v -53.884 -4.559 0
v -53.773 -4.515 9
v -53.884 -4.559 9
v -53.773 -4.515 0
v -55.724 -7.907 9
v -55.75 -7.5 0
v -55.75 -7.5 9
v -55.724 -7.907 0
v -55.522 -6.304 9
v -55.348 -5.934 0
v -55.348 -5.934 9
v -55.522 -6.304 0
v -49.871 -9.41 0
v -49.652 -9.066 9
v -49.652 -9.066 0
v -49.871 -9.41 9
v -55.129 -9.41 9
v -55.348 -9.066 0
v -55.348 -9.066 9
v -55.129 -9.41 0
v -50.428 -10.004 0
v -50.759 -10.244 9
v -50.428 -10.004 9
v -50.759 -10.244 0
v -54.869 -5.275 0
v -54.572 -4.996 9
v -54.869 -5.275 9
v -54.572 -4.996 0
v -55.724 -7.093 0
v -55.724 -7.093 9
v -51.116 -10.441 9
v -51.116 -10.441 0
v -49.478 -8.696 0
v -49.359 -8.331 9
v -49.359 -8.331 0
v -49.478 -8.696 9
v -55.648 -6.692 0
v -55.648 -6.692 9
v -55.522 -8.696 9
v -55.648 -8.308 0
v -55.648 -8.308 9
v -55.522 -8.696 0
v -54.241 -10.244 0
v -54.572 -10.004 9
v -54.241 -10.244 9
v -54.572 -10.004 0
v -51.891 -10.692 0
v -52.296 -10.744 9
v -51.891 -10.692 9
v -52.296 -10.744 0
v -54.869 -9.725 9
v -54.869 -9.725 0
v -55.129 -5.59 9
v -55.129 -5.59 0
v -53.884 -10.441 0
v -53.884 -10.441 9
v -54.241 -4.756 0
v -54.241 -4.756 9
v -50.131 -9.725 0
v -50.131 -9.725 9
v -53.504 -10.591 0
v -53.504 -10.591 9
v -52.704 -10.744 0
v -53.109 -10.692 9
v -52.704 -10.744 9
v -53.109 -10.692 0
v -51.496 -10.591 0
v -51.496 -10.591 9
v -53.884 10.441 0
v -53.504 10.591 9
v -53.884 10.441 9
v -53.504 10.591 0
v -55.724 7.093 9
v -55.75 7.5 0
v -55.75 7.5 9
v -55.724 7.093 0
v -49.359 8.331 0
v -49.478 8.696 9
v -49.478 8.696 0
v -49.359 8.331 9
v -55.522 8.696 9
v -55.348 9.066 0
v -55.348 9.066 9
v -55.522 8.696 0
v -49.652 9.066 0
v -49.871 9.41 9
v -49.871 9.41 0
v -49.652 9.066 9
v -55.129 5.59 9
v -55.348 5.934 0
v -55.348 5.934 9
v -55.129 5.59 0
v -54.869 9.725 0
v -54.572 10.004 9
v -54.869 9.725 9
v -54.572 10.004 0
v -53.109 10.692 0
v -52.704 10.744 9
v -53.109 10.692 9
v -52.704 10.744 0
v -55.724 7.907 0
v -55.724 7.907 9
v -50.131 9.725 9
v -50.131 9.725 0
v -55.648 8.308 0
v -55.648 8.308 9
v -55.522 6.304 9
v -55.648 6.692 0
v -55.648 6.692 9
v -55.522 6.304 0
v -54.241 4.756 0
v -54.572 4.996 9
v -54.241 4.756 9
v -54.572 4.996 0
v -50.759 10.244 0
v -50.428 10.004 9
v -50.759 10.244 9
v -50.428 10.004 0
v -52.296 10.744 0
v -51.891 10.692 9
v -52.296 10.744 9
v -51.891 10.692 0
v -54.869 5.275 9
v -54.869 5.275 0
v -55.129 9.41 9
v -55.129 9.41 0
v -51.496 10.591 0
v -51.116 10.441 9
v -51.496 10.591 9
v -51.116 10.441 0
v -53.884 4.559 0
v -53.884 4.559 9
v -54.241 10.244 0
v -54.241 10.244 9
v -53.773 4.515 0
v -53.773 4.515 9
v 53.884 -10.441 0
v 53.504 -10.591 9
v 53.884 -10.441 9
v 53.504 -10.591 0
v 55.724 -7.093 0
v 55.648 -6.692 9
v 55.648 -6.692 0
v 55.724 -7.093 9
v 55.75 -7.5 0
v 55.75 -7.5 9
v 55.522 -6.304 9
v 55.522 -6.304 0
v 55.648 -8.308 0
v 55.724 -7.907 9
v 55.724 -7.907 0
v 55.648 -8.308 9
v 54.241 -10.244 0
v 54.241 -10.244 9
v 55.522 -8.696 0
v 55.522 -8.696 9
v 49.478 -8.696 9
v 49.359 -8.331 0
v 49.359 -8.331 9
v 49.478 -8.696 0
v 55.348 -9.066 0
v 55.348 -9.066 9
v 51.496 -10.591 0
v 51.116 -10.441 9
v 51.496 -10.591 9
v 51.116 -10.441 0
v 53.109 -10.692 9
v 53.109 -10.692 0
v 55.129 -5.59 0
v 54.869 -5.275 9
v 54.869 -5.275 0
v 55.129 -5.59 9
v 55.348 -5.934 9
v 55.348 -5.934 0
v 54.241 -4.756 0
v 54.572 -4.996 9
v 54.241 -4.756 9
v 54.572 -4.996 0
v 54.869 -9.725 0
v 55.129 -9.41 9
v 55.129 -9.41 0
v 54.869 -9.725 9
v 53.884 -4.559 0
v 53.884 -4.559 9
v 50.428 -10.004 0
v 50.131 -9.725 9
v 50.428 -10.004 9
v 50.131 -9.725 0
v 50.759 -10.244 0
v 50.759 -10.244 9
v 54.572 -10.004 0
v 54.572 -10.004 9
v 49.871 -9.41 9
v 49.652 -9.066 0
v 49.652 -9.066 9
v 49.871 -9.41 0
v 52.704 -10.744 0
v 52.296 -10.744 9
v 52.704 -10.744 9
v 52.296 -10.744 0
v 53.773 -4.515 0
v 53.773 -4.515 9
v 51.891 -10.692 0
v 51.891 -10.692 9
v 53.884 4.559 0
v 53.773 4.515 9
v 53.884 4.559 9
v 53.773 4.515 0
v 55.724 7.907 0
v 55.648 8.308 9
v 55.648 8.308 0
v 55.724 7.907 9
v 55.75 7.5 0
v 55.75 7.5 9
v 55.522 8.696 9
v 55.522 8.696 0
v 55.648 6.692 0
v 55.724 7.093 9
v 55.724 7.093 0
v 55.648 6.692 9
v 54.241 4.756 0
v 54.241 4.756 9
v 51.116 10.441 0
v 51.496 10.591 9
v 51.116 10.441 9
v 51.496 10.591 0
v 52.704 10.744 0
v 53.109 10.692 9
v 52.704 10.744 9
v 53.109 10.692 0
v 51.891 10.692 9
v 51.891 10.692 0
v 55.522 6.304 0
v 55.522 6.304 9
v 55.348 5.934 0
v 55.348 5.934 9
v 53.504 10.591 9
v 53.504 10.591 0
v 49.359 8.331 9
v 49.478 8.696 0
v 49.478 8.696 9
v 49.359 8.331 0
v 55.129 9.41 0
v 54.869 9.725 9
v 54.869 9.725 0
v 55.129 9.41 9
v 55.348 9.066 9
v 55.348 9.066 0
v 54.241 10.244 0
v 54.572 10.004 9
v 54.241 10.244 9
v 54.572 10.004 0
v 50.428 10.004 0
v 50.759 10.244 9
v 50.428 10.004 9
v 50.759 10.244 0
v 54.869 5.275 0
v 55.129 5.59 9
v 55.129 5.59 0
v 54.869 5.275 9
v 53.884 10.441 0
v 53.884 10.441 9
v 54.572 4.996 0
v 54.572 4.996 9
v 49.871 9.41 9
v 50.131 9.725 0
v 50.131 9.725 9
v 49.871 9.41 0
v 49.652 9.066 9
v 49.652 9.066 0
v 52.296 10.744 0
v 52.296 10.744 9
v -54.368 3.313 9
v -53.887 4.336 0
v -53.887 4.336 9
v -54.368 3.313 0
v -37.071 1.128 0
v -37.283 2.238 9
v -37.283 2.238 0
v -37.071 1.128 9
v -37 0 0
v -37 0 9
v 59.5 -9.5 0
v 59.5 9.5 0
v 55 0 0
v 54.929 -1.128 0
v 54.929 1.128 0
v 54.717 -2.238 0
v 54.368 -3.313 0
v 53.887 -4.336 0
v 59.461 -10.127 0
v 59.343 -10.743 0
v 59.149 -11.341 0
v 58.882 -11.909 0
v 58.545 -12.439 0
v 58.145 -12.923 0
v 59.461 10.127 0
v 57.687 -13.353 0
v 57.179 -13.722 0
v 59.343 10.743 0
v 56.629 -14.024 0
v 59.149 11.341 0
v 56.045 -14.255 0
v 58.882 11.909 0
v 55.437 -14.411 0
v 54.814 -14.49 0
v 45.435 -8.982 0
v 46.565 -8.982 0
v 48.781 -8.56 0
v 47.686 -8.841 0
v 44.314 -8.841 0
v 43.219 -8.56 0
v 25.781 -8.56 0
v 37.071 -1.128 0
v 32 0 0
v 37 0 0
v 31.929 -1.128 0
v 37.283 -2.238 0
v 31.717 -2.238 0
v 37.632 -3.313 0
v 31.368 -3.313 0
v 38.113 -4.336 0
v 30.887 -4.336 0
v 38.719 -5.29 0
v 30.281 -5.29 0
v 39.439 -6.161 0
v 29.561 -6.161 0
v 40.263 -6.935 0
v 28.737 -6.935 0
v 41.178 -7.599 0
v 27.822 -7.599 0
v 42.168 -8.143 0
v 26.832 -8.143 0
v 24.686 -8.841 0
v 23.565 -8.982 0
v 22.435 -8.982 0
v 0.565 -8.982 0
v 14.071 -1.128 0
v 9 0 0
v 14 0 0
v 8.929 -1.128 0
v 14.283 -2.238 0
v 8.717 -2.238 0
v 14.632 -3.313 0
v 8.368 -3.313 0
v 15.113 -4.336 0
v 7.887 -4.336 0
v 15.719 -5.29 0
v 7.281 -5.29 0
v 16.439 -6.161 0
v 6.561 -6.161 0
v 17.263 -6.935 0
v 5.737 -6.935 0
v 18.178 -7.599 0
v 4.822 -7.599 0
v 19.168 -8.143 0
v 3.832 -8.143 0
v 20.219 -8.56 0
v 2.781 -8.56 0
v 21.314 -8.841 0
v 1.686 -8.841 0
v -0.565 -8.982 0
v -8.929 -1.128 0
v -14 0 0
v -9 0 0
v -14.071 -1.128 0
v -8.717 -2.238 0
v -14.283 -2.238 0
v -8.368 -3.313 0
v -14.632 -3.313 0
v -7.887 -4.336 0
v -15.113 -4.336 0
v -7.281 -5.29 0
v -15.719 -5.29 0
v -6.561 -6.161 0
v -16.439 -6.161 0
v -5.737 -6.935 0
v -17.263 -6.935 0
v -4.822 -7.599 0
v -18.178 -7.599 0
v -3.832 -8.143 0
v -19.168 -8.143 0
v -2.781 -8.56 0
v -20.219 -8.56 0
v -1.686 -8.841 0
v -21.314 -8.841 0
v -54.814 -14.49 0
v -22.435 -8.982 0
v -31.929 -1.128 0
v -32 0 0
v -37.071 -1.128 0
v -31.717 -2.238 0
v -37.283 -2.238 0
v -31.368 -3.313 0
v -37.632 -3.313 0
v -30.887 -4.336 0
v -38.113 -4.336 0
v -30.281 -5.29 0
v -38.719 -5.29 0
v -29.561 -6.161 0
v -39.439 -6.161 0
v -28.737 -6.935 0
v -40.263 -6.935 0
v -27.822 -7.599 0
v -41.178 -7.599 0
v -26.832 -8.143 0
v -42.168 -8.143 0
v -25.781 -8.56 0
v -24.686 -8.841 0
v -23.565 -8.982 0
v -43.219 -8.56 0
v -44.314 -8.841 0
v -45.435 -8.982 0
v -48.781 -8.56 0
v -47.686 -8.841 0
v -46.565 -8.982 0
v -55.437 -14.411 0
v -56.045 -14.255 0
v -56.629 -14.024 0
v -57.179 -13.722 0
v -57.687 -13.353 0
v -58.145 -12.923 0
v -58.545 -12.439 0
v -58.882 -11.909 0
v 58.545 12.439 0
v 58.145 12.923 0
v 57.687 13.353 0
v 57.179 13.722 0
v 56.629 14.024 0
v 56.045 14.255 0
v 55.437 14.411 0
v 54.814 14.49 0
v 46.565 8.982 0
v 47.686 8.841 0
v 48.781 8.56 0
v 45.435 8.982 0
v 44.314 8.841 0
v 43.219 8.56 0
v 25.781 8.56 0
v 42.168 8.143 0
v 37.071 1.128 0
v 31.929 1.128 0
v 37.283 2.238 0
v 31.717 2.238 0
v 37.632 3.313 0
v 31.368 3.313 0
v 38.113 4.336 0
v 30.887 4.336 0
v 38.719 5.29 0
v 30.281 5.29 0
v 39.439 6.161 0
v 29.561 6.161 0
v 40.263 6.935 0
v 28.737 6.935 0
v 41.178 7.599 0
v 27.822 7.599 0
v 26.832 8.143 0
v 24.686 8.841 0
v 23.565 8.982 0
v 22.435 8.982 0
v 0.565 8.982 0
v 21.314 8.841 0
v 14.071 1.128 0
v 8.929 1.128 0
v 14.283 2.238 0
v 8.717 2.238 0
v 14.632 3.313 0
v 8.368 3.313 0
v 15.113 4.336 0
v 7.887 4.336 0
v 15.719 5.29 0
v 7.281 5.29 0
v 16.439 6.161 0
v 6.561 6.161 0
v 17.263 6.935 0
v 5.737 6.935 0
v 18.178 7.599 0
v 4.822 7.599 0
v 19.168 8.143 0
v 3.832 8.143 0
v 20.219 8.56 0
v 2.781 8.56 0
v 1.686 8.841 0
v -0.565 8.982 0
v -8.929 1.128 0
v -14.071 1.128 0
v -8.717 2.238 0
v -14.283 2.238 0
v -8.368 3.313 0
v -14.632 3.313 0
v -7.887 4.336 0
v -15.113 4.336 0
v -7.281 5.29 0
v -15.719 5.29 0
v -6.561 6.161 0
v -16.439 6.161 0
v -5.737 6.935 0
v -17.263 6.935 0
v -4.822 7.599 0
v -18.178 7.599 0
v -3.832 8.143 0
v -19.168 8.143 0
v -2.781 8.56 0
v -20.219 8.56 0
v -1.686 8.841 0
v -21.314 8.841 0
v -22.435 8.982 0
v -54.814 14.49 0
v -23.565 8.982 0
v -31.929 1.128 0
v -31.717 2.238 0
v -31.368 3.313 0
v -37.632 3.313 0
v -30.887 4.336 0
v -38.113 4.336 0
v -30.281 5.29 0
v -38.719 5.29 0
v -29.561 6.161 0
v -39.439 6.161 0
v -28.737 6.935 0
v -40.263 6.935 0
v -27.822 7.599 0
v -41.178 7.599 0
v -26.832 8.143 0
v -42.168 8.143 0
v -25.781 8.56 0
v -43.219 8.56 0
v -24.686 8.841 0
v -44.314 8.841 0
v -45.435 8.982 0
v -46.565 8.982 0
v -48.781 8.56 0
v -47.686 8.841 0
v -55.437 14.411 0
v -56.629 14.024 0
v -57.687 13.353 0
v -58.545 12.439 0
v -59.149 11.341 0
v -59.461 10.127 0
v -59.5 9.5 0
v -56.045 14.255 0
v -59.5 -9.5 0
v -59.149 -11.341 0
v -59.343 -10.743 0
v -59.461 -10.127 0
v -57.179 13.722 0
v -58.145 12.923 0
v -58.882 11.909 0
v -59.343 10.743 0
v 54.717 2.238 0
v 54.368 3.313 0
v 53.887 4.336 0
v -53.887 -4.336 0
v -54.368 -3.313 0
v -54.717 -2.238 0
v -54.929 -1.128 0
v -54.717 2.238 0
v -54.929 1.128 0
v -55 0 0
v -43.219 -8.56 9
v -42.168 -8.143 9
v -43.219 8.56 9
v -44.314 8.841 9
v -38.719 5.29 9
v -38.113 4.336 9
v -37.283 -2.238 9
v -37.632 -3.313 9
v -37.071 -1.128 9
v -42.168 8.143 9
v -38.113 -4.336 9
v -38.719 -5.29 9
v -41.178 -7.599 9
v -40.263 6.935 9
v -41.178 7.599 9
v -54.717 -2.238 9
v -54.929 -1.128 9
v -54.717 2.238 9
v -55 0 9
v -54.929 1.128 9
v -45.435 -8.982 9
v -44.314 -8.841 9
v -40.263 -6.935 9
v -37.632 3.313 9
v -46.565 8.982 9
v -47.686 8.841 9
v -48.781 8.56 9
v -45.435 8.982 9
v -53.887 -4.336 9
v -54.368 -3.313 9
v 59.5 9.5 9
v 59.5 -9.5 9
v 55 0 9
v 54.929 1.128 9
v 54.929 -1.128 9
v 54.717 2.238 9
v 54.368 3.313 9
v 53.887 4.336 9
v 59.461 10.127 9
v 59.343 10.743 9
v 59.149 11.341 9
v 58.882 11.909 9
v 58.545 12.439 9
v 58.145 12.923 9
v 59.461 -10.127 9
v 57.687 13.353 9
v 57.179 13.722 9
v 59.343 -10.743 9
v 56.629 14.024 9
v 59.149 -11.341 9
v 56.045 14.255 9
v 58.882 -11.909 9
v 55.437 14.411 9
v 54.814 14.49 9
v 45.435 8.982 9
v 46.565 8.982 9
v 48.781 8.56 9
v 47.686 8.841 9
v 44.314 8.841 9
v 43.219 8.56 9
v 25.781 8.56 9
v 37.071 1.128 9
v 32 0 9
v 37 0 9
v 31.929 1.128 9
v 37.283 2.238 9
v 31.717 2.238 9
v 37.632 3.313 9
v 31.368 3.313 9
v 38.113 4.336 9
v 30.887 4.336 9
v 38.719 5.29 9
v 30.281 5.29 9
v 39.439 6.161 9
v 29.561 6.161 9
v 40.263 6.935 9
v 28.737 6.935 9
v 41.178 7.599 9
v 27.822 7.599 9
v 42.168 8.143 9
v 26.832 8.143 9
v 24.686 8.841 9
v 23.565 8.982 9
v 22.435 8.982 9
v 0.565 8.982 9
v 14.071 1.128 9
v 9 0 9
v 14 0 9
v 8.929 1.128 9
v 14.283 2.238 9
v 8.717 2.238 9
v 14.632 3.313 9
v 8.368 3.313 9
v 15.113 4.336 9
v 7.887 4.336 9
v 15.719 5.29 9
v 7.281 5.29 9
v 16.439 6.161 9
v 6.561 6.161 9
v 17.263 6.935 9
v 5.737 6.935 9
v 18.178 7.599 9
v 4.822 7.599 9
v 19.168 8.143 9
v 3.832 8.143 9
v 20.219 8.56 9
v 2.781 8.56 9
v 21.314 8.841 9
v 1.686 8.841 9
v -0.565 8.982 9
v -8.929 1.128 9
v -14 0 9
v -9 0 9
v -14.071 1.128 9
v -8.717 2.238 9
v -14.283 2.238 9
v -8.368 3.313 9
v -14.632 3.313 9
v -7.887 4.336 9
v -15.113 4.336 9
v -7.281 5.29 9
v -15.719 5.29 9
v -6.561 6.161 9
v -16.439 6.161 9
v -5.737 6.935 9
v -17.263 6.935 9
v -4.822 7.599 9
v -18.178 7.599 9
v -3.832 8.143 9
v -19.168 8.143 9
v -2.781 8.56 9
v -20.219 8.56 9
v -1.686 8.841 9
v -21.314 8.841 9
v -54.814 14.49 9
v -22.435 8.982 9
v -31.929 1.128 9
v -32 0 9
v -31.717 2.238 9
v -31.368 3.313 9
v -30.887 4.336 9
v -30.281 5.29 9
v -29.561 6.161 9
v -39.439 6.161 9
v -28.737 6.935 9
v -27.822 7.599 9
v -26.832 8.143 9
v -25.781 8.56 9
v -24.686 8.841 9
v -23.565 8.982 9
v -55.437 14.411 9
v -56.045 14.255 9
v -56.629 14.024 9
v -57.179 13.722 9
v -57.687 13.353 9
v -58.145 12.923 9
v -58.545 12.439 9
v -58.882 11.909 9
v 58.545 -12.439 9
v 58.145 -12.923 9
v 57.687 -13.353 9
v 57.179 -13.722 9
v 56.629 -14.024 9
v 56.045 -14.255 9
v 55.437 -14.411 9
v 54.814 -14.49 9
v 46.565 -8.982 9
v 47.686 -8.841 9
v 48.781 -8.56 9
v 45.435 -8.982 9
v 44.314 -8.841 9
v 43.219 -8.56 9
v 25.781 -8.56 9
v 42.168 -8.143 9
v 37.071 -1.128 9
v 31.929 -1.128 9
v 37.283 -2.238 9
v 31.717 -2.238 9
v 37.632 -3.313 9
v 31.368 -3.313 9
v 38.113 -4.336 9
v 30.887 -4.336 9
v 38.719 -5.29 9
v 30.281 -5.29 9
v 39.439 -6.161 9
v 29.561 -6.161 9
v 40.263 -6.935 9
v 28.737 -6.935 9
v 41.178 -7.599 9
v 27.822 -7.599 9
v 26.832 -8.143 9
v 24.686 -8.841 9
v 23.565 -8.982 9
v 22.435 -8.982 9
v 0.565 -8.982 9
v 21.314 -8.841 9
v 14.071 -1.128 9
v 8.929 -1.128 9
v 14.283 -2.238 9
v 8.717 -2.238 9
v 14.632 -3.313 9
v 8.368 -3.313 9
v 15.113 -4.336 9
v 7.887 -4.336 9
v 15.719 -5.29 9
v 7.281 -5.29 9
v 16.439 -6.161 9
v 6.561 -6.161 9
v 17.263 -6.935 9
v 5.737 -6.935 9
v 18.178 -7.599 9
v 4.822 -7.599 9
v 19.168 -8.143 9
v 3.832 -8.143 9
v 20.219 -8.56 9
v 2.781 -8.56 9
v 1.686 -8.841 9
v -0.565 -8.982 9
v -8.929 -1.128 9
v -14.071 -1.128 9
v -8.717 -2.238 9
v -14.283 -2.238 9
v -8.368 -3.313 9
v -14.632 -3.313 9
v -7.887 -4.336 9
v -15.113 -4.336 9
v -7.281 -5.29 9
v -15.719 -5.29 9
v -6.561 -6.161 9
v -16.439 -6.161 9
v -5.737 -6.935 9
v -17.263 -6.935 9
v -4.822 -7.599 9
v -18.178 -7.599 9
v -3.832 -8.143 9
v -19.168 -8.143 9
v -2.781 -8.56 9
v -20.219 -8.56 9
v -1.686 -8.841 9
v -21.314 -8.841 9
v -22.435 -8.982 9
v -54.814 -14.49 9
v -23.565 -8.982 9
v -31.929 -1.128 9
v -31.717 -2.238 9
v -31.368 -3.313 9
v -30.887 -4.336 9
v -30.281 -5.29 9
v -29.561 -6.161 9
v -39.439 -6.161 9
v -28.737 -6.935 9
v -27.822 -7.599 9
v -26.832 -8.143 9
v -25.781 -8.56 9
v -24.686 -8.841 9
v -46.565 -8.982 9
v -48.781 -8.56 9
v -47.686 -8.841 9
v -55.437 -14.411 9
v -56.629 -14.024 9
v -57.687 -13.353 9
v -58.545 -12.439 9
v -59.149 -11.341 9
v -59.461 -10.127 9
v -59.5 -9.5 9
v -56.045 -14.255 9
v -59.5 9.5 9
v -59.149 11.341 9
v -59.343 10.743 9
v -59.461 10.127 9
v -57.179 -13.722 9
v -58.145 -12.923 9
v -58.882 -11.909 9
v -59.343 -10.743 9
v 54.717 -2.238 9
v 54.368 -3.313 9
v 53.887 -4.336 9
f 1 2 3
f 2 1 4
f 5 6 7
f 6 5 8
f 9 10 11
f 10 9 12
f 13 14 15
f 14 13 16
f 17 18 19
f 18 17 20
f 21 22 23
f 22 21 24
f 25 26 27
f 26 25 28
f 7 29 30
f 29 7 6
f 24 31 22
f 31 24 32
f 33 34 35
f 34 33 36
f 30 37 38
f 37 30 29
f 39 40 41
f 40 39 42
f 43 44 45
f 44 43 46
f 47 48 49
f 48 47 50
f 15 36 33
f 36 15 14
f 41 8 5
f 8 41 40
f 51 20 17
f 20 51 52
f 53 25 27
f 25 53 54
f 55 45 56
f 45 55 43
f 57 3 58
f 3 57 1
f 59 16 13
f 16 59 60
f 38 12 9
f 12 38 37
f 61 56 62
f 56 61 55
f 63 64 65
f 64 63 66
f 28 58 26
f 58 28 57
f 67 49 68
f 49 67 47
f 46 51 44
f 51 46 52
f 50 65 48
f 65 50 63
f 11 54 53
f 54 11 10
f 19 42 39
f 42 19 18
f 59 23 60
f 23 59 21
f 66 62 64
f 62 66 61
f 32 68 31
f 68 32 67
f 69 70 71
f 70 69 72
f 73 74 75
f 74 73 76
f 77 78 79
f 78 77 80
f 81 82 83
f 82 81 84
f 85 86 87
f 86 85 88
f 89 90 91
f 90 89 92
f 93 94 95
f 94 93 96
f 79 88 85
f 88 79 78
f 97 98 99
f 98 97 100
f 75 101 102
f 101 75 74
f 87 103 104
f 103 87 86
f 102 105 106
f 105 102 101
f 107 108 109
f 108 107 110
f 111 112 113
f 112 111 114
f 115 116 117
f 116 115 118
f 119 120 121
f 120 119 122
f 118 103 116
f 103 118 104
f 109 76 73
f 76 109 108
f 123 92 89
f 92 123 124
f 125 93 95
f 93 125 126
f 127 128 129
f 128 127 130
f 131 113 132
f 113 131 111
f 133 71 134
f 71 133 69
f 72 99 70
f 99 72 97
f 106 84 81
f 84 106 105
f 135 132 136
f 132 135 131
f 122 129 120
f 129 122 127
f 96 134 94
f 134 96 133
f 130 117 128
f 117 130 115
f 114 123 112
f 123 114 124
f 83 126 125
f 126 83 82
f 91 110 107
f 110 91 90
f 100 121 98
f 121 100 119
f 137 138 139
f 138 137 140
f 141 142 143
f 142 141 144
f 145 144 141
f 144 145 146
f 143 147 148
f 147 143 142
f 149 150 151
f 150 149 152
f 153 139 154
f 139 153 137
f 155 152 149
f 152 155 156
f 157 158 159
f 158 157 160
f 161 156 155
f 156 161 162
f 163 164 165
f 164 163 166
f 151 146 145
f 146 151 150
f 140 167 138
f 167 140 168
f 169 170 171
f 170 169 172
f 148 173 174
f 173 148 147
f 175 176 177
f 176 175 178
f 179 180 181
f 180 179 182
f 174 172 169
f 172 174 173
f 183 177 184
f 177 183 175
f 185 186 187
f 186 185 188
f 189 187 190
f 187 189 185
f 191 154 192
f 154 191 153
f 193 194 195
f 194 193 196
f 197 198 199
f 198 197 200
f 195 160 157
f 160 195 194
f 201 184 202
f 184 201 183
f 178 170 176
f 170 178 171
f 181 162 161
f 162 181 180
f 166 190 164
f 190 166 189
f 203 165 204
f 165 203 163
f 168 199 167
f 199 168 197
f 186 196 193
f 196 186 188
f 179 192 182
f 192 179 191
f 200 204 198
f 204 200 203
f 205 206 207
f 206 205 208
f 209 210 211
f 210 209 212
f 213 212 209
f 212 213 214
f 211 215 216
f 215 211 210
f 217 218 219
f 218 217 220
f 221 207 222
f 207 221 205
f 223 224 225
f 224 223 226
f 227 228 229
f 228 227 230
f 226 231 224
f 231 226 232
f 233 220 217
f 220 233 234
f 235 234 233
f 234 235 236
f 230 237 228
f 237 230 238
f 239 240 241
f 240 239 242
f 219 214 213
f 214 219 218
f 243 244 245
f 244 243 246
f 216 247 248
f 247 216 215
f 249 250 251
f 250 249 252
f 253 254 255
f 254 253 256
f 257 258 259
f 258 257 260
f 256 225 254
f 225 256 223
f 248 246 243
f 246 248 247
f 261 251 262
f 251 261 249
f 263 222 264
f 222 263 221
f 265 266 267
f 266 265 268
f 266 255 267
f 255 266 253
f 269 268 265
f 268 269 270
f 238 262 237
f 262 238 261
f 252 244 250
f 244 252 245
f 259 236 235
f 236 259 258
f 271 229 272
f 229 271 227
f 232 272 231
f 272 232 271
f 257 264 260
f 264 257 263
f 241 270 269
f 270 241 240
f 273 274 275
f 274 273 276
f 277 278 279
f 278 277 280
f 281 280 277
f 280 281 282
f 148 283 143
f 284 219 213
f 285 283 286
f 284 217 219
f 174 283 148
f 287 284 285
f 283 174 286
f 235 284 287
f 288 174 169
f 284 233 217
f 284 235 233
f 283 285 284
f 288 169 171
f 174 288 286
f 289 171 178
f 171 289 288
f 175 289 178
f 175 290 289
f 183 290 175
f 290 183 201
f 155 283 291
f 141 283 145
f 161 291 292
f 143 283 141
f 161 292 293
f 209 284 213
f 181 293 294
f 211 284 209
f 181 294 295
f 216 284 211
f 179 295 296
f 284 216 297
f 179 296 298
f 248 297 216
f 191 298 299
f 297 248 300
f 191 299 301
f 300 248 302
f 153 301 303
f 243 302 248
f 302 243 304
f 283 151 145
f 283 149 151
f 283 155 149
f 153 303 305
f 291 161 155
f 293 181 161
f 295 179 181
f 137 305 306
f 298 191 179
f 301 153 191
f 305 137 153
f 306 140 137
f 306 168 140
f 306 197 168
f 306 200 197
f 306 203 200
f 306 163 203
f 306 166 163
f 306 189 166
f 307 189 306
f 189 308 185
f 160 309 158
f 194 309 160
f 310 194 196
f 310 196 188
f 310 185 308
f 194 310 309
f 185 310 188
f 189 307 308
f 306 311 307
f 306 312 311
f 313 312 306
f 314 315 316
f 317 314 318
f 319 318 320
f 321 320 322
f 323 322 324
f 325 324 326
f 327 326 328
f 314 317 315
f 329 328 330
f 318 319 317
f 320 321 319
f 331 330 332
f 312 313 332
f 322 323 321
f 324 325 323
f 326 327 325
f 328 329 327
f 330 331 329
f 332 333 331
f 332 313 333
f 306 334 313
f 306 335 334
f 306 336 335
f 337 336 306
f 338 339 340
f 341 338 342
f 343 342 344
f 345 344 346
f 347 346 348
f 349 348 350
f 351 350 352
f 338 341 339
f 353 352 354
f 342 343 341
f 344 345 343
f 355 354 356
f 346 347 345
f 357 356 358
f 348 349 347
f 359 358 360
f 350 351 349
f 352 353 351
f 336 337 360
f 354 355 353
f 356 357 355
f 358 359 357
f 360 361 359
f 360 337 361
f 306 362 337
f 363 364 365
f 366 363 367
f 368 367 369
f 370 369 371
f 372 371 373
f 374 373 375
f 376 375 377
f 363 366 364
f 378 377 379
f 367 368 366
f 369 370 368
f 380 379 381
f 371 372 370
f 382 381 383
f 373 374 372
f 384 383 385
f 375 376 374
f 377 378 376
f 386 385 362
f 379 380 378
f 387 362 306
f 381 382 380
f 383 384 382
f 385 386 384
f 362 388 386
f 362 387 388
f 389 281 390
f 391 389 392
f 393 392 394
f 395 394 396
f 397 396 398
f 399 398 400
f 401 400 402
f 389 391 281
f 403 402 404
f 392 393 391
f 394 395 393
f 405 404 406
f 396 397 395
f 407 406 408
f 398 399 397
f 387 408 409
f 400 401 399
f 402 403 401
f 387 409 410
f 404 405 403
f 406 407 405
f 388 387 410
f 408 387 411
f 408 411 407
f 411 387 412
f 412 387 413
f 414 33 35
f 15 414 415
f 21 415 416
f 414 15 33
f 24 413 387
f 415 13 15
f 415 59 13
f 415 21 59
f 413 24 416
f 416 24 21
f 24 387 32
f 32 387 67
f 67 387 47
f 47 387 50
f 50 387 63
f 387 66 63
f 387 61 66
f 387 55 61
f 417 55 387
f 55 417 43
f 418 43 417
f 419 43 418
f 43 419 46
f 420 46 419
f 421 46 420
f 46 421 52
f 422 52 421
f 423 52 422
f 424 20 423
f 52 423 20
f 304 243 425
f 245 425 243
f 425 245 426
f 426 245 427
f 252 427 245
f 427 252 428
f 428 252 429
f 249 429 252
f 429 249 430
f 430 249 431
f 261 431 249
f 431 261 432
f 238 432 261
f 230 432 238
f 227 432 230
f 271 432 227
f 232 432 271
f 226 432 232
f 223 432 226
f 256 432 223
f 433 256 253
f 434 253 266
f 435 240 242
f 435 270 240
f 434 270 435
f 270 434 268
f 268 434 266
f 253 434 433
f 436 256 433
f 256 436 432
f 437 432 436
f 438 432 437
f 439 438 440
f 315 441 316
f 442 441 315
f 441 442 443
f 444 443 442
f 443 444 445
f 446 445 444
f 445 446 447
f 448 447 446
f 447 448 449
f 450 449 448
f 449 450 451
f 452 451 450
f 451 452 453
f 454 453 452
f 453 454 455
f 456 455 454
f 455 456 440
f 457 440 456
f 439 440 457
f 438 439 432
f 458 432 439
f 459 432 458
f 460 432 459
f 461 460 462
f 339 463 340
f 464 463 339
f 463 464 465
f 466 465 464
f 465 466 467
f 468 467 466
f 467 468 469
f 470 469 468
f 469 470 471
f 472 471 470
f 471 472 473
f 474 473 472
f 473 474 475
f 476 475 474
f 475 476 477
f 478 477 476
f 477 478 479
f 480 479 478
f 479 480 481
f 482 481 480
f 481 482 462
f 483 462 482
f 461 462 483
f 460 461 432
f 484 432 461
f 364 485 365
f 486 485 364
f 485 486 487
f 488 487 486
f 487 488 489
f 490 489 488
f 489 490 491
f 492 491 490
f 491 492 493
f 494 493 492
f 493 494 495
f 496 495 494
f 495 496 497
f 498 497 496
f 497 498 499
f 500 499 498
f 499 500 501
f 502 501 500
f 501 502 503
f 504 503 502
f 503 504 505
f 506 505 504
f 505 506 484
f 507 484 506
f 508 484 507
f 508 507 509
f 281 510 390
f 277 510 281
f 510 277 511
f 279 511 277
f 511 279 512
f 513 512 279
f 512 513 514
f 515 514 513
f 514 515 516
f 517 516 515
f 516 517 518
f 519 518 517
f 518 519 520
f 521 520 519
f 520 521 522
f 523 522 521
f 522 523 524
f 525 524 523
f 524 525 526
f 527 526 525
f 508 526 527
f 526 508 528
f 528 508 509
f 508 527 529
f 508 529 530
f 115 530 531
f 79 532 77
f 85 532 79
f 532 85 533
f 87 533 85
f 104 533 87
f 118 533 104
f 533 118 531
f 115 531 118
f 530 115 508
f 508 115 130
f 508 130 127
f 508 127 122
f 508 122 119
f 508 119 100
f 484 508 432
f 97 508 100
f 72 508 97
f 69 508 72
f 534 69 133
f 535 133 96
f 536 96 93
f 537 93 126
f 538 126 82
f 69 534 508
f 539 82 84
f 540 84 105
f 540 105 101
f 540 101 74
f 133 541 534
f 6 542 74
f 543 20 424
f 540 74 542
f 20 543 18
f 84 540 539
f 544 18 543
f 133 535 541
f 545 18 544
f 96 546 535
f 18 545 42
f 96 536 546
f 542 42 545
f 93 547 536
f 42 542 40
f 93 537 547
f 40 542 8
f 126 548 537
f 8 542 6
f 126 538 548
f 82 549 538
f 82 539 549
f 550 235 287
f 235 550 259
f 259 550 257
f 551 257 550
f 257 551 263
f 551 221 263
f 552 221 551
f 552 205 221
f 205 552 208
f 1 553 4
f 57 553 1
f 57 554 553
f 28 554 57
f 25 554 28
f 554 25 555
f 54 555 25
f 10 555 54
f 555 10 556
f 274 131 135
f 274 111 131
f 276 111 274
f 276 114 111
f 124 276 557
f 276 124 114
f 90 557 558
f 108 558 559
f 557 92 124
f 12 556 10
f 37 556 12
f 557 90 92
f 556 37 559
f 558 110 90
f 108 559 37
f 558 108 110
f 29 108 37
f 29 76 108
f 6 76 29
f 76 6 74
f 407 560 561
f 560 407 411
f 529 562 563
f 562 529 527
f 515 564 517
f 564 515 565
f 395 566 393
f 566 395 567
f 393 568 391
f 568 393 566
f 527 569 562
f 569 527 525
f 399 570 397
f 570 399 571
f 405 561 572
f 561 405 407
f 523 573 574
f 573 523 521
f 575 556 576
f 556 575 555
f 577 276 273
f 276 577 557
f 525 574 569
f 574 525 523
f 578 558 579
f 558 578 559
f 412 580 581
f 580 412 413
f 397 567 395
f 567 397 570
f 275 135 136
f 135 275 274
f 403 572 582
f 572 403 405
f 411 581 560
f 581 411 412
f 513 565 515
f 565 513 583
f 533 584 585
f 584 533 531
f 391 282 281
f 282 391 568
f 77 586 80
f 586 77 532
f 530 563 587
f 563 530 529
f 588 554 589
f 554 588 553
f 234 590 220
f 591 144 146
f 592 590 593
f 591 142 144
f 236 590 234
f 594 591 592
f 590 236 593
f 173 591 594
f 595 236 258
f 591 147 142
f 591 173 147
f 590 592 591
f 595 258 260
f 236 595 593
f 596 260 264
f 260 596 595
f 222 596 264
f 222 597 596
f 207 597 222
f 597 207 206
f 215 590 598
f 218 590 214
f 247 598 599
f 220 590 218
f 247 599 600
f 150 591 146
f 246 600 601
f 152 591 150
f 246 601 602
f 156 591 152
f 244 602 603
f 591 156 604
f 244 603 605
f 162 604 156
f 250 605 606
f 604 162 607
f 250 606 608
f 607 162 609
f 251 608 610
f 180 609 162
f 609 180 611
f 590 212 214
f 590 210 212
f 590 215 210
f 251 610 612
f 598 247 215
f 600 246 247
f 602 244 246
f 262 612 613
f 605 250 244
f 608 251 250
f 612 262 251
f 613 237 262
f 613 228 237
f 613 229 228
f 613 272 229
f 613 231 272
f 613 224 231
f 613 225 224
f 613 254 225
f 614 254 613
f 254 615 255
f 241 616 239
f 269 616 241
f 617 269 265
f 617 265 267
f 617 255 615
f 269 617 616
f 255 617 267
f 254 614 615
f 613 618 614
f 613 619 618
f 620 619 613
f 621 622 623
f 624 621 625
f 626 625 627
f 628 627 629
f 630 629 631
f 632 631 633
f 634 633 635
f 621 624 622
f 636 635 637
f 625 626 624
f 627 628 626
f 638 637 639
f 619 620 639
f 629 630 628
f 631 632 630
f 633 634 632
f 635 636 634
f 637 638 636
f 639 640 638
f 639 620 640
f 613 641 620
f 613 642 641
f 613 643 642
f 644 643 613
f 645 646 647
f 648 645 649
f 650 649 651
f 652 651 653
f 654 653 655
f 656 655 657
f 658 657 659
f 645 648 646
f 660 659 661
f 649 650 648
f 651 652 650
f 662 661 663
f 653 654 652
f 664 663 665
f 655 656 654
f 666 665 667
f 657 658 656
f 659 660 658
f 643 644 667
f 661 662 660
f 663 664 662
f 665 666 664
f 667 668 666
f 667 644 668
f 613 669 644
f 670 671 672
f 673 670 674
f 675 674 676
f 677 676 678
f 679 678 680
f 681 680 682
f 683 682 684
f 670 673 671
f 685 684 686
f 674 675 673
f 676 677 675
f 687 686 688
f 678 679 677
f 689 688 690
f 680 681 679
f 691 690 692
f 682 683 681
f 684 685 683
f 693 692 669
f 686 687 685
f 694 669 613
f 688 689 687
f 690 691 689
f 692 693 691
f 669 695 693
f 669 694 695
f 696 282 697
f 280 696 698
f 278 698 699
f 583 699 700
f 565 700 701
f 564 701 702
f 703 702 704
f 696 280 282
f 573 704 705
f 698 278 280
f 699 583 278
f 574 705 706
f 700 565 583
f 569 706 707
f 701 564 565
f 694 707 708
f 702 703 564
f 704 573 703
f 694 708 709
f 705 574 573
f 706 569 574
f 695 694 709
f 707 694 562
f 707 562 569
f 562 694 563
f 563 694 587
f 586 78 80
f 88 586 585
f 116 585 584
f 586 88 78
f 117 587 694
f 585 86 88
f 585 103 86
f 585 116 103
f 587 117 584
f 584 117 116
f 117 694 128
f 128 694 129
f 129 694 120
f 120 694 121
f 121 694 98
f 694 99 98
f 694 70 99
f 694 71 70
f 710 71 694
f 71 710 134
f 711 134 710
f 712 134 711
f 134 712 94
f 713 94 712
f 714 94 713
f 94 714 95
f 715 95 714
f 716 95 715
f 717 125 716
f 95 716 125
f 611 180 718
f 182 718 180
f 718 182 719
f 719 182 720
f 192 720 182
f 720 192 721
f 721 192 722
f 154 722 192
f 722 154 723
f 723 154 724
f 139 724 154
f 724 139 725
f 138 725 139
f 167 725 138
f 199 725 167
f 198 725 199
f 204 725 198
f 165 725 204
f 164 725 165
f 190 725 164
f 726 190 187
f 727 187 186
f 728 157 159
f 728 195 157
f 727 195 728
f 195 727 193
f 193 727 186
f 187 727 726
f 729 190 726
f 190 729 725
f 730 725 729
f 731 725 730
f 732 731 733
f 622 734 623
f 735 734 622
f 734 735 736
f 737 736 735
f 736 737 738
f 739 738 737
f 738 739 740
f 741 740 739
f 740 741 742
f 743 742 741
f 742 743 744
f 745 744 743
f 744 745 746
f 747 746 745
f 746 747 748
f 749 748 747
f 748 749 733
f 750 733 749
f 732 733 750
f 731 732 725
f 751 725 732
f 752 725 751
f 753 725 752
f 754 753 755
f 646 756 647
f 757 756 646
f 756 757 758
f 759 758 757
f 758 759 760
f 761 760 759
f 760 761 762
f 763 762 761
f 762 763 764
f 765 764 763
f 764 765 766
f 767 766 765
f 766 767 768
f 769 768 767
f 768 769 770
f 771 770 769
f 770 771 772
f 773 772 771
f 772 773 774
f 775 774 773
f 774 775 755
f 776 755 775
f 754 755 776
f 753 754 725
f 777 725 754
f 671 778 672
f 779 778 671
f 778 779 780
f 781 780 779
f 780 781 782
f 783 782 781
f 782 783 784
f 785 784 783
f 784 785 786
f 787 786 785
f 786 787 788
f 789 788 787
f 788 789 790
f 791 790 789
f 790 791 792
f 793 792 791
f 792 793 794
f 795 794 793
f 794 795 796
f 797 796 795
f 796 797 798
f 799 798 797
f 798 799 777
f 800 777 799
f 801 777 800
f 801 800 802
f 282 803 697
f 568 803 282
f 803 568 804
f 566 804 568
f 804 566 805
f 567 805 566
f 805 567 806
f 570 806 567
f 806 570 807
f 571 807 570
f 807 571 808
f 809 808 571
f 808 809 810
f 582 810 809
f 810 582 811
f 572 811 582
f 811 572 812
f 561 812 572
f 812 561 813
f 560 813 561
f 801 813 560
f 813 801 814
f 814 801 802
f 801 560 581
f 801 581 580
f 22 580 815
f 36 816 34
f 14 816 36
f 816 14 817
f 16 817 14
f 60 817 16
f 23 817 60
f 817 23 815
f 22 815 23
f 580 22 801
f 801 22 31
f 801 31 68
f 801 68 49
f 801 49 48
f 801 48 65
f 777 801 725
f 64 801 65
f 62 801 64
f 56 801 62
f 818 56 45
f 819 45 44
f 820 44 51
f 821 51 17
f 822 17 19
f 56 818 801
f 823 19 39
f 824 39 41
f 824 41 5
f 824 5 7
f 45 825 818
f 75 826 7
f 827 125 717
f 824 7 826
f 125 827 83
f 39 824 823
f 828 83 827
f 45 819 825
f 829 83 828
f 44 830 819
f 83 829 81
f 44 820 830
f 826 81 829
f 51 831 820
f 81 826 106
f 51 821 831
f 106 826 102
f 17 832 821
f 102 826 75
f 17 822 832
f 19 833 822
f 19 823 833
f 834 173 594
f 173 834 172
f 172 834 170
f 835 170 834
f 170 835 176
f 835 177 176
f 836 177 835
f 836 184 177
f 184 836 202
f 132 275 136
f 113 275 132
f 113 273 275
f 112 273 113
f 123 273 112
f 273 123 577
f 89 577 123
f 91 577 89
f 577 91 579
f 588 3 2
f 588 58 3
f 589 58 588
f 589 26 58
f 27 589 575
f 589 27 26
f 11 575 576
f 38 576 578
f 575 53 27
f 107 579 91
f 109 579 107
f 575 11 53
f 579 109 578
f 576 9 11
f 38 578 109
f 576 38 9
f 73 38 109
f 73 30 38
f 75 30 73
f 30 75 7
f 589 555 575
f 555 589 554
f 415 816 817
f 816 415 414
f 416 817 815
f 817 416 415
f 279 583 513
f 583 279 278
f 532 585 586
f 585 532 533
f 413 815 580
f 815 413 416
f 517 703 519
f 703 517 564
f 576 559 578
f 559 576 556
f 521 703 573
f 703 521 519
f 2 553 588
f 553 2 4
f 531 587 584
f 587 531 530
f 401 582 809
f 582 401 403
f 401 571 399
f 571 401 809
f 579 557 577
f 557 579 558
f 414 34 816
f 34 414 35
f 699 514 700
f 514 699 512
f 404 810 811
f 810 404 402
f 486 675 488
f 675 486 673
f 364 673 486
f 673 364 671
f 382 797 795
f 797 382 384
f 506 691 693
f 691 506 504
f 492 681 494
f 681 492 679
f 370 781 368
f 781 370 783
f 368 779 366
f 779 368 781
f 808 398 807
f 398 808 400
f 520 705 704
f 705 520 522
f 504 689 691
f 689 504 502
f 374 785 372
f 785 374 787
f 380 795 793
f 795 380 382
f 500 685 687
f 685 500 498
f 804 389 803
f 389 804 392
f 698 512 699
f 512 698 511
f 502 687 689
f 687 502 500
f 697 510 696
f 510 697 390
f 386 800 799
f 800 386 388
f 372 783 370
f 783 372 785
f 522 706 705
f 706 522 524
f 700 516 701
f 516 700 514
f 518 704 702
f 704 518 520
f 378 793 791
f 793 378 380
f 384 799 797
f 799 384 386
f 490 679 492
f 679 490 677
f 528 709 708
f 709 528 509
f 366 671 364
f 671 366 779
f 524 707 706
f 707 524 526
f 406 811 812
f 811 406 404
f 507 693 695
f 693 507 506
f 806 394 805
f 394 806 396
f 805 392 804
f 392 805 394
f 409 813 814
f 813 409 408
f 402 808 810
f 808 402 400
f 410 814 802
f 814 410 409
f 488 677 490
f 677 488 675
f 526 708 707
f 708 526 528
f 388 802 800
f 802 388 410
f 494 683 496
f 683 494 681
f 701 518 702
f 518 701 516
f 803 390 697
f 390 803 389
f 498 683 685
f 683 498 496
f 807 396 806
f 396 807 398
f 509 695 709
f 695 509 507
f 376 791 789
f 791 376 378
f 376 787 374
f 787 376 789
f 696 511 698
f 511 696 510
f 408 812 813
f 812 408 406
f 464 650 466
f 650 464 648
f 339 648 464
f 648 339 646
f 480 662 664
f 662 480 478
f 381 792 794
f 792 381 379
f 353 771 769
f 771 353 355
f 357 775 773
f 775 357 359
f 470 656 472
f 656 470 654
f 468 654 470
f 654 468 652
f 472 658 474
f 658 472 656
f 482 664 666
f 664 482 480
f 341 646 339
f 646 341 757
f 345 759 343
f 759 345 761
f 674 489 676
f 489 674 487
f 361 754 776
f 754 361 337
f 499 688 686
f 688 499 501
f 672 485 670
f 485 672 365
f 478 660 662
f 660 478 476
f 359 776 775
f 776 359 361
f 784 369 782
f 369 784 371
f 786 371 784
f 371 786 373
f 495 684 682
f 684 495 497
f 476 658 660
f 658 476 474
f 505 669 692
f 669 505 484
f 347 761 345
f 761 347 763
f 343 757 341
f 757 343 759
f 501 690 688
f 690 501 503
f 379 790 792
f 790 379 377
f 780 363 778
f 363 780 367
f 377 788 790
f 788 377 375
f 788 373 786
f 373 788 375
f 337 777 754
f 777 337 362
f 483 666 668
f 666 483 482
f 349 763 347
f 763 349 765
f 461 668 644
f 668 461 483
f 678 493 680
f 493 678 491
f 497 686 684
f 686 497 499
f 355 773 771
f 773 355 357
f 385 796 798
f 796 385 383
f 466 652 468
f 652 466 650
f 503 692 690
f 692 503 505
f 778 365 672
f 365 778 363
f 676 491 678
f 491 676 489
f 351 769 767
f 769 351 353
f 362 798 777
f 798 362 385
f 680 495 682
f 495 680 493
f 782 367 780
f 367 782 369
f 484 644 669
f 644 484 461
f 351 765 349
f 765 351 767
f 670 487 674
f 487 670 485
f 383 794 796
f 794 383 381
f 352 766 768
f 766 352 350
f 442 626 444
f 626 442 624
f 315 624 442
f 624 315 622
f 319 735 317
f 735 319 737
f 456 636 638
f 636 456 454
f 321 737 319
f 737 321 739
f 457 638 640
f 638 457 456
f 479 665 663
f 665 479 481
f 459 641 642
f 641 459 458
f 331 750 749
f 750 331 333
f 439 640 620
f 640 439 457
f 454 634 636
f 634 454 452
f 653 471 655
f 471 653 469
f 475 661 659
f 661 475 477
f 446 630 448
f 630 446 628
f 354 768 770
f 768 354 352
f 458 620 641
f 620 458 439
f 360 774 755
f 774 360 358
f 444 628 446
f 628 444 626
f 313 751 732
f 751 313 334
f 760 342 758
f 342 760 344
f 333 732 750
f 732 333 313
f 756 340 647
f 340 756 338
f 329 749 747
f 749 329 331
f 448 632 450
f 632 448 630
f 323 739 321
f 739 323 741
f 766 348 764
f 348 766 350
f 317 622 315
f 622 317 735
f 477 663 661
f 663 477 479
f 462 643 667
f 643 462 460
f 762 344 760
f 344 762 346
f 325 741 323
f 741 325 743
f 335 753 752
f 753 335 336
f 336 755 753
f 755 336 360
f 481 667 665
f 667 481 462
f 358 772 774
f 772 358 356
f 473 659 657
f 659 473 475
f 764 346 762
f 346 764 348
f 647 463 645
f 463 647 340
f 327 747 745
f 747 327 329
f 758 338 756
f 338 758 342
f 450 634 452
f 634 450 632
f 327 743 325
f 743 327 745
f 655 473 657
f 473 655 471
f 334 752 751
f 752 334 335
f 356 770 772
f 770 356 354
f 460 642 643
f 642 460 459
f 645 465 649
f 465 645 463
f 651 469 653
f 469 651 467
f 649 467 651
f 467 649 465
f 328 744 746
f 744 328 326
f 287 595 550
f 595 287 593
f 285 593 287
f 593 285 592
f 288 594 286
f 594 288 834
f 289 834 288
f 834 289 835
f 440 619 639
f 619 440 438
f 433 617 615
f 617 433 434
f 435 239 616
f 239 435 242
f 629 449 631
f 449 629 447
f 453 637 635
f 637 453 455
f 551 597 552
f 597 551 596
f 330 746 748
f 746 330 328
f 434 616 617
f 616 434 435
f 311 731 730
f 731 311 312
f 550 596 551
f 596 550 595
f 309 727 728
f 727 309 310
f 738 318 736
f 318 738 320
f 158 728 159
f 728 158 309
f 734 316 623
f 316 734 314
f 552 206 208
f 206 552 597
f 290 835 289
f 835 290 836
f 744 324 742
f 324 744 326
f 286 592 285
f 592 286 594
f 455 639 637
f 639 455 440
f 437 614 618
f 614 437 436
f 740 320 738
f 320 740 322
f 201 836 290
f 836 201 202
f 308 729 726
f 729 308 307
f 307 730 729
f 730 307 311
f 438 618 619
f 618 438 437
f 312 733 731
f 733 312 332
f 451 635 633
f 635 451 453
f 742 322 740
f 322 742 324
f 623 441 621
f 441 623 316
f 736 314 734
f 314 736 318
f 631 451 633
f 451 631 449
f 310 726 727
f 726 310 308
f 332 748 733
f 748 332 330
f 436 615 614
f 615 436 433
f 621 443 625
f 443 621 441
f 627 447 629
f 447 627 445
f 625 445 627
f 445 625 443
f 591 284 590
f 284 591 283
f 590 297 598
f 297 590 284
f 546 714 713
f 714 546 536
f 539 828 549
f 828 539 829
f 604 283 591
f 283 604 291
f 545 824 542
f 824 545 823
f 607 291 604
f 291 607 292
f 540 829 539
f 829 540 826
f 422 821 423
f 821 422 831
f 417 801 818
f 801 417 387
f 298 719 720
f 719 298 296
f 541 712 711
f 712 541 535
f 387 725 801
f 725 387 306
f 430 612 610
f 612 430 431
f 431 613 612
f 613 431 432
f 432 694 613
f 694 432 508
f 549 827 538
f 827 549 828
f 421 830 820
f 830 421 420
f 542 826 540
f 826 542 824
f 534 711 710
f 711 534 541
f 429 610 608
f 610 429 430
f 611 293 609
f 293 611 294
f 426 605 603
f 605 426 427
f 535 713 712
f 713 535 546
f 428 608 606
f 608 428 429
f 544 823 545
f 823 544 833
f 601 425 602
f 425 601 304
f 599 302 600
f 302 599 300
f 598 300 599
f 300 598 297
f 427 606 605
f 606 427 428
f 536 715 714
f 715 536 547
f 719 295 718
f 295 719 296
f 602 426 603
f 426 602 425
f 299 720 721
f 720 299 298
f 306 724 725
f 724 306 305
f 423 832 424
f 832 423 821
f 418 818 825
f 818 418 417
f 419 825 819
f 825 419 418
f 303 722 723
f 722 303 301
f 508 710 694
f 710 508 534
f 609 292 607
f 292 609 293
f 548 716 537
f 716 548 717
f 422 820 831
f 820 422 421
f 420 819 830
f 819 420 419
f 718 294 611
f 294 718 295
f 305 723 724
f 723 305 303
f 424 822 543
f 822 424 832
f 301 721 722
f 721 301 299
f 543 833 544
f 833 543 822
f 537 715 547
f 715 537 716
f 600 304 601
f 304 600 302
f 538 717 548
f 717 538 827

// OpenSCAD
$fn = 50;


difference() {
	union() {
		hull() {
			translate(v = [-54.5000000000, 9.5000000000, 0]) {
				cylinder(h = 9, r = 5);
			}
			translate(v = [54.5000000000, 9.5000000000, 0]) {
				cylinder(h = 9, r = 5);
			}
			translate(v = [-54.5000000000, -9.5000000000, 0]) {
				cylinder(h = 9, r = 5);
			}
			translate(v = [54.5000000000, -9.5000000000, 0]) {
				cylinder(h = 9, r = 5);
			}
		}
	}
	union() {
		#translate(v = [-52.5000000000, -7.5000000000, -100.0000000000]) {
			cylinder(h = 200, r = 3.2500000000);
		}
		#translate(v = [-52.5000000000, 7.5000000000, -100.0000000000]) {
			cylinder(h = 200, r = 3.2500000000);
		}
		#translate(v = [52.5000000000, -7.5000000000, -100.0000000000]) {
			cylinder(h = 200, r = 3.2500000000);
		}
		#translate(v = [52.5000000000, 7.5000000000, -100.0000000000]) {
			cylinder(h = 200, r = 3.2500000000);
		}
		#translate(v = [-46.0000000000, 0, 0]) {
			cylinder(h = 9, r = 9.0000000000);
		}
		#translate(v = [-23.0000000000, 0, 0]) {
			cylinder(h = 9, r = 9.0000000000);
		}
		#cylinder(h = 9, r = 9.0000000000);
		#translate(v = [23.0000000000, 0, 0]) {
			cylinder(h = 9, r = 9.0000000000);
		}
		#translate(v = [46.0000000000, 0, 0]) {
			cylinder(h = 9, r = 9.0000000000);
		}
	}
}
